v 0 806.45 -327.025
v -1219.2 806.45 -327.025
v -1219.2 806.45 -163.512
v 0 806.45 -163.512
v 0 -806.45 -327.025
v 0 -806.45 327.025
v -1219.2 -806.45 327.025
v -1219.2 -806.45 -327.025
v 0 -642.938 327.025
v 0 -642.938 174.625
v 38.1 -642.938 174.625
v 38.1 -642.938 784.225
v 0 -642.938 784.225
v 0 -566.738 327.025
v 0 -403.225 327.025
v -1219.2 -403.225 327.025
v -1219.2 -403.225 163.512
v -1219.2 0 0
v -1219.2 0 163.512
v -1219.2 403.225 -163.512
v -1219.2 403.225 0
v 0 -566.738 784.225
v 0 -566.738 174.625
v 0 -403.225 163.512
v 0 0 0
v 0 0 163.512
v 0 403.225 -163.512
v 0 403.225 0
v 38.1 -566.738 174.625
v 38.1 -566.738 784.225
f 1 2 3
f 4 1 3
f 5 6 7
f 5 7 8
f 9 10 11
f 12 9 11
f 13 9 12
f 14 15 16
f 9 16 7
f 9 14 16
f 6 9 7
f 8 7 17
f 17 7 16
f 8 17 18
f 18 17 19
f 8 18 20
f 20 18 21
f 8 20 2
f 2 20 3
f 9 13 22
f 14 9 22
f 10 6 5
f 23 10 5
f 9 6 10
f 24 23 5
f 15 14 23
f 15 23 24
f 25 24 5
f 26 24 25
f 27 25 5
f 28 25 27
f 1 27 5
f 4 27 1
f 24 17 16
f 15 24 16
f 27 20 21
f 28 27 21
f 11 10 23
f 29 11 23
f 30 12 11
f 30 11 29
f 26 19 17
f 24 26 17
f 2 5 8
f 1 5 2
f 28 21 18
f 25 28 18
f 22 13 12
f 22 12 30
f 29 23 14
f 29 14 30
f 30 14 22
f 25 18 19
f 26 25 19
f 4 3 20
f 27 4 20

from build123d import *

# Parameters (mm, degrees)
F1_DEPTH = 1219.2
F2_W     = 76.2
F2_H     = 609.6
F3_DEPTH = 38.1


with BuildPart() as f1:
    # F0 (on Right) → F1 (new body)
    with BuildSketch(Plane.YZ):
        Polygon((-806.45, 327.025), (-806.45, -327.025), (806.45, -327.025), (806.45, -163.5125), (403.225, -163.5125), (403.225, 0), (0, 0), (0, 163.5125), (-403.225, 163.5125), (-403.225, 327.025), align=None)
    extrude(amount=-F1_DEPTH)

    # F2 (on face) → F3 (join)
    with BuildSketch(Plane.YZ):
        with Locations((-604.8375, 479.425)):
            Rectangle(F2_W, F2_H)
    extrude(amount=F3_DEPTH)


solid = f1.part
